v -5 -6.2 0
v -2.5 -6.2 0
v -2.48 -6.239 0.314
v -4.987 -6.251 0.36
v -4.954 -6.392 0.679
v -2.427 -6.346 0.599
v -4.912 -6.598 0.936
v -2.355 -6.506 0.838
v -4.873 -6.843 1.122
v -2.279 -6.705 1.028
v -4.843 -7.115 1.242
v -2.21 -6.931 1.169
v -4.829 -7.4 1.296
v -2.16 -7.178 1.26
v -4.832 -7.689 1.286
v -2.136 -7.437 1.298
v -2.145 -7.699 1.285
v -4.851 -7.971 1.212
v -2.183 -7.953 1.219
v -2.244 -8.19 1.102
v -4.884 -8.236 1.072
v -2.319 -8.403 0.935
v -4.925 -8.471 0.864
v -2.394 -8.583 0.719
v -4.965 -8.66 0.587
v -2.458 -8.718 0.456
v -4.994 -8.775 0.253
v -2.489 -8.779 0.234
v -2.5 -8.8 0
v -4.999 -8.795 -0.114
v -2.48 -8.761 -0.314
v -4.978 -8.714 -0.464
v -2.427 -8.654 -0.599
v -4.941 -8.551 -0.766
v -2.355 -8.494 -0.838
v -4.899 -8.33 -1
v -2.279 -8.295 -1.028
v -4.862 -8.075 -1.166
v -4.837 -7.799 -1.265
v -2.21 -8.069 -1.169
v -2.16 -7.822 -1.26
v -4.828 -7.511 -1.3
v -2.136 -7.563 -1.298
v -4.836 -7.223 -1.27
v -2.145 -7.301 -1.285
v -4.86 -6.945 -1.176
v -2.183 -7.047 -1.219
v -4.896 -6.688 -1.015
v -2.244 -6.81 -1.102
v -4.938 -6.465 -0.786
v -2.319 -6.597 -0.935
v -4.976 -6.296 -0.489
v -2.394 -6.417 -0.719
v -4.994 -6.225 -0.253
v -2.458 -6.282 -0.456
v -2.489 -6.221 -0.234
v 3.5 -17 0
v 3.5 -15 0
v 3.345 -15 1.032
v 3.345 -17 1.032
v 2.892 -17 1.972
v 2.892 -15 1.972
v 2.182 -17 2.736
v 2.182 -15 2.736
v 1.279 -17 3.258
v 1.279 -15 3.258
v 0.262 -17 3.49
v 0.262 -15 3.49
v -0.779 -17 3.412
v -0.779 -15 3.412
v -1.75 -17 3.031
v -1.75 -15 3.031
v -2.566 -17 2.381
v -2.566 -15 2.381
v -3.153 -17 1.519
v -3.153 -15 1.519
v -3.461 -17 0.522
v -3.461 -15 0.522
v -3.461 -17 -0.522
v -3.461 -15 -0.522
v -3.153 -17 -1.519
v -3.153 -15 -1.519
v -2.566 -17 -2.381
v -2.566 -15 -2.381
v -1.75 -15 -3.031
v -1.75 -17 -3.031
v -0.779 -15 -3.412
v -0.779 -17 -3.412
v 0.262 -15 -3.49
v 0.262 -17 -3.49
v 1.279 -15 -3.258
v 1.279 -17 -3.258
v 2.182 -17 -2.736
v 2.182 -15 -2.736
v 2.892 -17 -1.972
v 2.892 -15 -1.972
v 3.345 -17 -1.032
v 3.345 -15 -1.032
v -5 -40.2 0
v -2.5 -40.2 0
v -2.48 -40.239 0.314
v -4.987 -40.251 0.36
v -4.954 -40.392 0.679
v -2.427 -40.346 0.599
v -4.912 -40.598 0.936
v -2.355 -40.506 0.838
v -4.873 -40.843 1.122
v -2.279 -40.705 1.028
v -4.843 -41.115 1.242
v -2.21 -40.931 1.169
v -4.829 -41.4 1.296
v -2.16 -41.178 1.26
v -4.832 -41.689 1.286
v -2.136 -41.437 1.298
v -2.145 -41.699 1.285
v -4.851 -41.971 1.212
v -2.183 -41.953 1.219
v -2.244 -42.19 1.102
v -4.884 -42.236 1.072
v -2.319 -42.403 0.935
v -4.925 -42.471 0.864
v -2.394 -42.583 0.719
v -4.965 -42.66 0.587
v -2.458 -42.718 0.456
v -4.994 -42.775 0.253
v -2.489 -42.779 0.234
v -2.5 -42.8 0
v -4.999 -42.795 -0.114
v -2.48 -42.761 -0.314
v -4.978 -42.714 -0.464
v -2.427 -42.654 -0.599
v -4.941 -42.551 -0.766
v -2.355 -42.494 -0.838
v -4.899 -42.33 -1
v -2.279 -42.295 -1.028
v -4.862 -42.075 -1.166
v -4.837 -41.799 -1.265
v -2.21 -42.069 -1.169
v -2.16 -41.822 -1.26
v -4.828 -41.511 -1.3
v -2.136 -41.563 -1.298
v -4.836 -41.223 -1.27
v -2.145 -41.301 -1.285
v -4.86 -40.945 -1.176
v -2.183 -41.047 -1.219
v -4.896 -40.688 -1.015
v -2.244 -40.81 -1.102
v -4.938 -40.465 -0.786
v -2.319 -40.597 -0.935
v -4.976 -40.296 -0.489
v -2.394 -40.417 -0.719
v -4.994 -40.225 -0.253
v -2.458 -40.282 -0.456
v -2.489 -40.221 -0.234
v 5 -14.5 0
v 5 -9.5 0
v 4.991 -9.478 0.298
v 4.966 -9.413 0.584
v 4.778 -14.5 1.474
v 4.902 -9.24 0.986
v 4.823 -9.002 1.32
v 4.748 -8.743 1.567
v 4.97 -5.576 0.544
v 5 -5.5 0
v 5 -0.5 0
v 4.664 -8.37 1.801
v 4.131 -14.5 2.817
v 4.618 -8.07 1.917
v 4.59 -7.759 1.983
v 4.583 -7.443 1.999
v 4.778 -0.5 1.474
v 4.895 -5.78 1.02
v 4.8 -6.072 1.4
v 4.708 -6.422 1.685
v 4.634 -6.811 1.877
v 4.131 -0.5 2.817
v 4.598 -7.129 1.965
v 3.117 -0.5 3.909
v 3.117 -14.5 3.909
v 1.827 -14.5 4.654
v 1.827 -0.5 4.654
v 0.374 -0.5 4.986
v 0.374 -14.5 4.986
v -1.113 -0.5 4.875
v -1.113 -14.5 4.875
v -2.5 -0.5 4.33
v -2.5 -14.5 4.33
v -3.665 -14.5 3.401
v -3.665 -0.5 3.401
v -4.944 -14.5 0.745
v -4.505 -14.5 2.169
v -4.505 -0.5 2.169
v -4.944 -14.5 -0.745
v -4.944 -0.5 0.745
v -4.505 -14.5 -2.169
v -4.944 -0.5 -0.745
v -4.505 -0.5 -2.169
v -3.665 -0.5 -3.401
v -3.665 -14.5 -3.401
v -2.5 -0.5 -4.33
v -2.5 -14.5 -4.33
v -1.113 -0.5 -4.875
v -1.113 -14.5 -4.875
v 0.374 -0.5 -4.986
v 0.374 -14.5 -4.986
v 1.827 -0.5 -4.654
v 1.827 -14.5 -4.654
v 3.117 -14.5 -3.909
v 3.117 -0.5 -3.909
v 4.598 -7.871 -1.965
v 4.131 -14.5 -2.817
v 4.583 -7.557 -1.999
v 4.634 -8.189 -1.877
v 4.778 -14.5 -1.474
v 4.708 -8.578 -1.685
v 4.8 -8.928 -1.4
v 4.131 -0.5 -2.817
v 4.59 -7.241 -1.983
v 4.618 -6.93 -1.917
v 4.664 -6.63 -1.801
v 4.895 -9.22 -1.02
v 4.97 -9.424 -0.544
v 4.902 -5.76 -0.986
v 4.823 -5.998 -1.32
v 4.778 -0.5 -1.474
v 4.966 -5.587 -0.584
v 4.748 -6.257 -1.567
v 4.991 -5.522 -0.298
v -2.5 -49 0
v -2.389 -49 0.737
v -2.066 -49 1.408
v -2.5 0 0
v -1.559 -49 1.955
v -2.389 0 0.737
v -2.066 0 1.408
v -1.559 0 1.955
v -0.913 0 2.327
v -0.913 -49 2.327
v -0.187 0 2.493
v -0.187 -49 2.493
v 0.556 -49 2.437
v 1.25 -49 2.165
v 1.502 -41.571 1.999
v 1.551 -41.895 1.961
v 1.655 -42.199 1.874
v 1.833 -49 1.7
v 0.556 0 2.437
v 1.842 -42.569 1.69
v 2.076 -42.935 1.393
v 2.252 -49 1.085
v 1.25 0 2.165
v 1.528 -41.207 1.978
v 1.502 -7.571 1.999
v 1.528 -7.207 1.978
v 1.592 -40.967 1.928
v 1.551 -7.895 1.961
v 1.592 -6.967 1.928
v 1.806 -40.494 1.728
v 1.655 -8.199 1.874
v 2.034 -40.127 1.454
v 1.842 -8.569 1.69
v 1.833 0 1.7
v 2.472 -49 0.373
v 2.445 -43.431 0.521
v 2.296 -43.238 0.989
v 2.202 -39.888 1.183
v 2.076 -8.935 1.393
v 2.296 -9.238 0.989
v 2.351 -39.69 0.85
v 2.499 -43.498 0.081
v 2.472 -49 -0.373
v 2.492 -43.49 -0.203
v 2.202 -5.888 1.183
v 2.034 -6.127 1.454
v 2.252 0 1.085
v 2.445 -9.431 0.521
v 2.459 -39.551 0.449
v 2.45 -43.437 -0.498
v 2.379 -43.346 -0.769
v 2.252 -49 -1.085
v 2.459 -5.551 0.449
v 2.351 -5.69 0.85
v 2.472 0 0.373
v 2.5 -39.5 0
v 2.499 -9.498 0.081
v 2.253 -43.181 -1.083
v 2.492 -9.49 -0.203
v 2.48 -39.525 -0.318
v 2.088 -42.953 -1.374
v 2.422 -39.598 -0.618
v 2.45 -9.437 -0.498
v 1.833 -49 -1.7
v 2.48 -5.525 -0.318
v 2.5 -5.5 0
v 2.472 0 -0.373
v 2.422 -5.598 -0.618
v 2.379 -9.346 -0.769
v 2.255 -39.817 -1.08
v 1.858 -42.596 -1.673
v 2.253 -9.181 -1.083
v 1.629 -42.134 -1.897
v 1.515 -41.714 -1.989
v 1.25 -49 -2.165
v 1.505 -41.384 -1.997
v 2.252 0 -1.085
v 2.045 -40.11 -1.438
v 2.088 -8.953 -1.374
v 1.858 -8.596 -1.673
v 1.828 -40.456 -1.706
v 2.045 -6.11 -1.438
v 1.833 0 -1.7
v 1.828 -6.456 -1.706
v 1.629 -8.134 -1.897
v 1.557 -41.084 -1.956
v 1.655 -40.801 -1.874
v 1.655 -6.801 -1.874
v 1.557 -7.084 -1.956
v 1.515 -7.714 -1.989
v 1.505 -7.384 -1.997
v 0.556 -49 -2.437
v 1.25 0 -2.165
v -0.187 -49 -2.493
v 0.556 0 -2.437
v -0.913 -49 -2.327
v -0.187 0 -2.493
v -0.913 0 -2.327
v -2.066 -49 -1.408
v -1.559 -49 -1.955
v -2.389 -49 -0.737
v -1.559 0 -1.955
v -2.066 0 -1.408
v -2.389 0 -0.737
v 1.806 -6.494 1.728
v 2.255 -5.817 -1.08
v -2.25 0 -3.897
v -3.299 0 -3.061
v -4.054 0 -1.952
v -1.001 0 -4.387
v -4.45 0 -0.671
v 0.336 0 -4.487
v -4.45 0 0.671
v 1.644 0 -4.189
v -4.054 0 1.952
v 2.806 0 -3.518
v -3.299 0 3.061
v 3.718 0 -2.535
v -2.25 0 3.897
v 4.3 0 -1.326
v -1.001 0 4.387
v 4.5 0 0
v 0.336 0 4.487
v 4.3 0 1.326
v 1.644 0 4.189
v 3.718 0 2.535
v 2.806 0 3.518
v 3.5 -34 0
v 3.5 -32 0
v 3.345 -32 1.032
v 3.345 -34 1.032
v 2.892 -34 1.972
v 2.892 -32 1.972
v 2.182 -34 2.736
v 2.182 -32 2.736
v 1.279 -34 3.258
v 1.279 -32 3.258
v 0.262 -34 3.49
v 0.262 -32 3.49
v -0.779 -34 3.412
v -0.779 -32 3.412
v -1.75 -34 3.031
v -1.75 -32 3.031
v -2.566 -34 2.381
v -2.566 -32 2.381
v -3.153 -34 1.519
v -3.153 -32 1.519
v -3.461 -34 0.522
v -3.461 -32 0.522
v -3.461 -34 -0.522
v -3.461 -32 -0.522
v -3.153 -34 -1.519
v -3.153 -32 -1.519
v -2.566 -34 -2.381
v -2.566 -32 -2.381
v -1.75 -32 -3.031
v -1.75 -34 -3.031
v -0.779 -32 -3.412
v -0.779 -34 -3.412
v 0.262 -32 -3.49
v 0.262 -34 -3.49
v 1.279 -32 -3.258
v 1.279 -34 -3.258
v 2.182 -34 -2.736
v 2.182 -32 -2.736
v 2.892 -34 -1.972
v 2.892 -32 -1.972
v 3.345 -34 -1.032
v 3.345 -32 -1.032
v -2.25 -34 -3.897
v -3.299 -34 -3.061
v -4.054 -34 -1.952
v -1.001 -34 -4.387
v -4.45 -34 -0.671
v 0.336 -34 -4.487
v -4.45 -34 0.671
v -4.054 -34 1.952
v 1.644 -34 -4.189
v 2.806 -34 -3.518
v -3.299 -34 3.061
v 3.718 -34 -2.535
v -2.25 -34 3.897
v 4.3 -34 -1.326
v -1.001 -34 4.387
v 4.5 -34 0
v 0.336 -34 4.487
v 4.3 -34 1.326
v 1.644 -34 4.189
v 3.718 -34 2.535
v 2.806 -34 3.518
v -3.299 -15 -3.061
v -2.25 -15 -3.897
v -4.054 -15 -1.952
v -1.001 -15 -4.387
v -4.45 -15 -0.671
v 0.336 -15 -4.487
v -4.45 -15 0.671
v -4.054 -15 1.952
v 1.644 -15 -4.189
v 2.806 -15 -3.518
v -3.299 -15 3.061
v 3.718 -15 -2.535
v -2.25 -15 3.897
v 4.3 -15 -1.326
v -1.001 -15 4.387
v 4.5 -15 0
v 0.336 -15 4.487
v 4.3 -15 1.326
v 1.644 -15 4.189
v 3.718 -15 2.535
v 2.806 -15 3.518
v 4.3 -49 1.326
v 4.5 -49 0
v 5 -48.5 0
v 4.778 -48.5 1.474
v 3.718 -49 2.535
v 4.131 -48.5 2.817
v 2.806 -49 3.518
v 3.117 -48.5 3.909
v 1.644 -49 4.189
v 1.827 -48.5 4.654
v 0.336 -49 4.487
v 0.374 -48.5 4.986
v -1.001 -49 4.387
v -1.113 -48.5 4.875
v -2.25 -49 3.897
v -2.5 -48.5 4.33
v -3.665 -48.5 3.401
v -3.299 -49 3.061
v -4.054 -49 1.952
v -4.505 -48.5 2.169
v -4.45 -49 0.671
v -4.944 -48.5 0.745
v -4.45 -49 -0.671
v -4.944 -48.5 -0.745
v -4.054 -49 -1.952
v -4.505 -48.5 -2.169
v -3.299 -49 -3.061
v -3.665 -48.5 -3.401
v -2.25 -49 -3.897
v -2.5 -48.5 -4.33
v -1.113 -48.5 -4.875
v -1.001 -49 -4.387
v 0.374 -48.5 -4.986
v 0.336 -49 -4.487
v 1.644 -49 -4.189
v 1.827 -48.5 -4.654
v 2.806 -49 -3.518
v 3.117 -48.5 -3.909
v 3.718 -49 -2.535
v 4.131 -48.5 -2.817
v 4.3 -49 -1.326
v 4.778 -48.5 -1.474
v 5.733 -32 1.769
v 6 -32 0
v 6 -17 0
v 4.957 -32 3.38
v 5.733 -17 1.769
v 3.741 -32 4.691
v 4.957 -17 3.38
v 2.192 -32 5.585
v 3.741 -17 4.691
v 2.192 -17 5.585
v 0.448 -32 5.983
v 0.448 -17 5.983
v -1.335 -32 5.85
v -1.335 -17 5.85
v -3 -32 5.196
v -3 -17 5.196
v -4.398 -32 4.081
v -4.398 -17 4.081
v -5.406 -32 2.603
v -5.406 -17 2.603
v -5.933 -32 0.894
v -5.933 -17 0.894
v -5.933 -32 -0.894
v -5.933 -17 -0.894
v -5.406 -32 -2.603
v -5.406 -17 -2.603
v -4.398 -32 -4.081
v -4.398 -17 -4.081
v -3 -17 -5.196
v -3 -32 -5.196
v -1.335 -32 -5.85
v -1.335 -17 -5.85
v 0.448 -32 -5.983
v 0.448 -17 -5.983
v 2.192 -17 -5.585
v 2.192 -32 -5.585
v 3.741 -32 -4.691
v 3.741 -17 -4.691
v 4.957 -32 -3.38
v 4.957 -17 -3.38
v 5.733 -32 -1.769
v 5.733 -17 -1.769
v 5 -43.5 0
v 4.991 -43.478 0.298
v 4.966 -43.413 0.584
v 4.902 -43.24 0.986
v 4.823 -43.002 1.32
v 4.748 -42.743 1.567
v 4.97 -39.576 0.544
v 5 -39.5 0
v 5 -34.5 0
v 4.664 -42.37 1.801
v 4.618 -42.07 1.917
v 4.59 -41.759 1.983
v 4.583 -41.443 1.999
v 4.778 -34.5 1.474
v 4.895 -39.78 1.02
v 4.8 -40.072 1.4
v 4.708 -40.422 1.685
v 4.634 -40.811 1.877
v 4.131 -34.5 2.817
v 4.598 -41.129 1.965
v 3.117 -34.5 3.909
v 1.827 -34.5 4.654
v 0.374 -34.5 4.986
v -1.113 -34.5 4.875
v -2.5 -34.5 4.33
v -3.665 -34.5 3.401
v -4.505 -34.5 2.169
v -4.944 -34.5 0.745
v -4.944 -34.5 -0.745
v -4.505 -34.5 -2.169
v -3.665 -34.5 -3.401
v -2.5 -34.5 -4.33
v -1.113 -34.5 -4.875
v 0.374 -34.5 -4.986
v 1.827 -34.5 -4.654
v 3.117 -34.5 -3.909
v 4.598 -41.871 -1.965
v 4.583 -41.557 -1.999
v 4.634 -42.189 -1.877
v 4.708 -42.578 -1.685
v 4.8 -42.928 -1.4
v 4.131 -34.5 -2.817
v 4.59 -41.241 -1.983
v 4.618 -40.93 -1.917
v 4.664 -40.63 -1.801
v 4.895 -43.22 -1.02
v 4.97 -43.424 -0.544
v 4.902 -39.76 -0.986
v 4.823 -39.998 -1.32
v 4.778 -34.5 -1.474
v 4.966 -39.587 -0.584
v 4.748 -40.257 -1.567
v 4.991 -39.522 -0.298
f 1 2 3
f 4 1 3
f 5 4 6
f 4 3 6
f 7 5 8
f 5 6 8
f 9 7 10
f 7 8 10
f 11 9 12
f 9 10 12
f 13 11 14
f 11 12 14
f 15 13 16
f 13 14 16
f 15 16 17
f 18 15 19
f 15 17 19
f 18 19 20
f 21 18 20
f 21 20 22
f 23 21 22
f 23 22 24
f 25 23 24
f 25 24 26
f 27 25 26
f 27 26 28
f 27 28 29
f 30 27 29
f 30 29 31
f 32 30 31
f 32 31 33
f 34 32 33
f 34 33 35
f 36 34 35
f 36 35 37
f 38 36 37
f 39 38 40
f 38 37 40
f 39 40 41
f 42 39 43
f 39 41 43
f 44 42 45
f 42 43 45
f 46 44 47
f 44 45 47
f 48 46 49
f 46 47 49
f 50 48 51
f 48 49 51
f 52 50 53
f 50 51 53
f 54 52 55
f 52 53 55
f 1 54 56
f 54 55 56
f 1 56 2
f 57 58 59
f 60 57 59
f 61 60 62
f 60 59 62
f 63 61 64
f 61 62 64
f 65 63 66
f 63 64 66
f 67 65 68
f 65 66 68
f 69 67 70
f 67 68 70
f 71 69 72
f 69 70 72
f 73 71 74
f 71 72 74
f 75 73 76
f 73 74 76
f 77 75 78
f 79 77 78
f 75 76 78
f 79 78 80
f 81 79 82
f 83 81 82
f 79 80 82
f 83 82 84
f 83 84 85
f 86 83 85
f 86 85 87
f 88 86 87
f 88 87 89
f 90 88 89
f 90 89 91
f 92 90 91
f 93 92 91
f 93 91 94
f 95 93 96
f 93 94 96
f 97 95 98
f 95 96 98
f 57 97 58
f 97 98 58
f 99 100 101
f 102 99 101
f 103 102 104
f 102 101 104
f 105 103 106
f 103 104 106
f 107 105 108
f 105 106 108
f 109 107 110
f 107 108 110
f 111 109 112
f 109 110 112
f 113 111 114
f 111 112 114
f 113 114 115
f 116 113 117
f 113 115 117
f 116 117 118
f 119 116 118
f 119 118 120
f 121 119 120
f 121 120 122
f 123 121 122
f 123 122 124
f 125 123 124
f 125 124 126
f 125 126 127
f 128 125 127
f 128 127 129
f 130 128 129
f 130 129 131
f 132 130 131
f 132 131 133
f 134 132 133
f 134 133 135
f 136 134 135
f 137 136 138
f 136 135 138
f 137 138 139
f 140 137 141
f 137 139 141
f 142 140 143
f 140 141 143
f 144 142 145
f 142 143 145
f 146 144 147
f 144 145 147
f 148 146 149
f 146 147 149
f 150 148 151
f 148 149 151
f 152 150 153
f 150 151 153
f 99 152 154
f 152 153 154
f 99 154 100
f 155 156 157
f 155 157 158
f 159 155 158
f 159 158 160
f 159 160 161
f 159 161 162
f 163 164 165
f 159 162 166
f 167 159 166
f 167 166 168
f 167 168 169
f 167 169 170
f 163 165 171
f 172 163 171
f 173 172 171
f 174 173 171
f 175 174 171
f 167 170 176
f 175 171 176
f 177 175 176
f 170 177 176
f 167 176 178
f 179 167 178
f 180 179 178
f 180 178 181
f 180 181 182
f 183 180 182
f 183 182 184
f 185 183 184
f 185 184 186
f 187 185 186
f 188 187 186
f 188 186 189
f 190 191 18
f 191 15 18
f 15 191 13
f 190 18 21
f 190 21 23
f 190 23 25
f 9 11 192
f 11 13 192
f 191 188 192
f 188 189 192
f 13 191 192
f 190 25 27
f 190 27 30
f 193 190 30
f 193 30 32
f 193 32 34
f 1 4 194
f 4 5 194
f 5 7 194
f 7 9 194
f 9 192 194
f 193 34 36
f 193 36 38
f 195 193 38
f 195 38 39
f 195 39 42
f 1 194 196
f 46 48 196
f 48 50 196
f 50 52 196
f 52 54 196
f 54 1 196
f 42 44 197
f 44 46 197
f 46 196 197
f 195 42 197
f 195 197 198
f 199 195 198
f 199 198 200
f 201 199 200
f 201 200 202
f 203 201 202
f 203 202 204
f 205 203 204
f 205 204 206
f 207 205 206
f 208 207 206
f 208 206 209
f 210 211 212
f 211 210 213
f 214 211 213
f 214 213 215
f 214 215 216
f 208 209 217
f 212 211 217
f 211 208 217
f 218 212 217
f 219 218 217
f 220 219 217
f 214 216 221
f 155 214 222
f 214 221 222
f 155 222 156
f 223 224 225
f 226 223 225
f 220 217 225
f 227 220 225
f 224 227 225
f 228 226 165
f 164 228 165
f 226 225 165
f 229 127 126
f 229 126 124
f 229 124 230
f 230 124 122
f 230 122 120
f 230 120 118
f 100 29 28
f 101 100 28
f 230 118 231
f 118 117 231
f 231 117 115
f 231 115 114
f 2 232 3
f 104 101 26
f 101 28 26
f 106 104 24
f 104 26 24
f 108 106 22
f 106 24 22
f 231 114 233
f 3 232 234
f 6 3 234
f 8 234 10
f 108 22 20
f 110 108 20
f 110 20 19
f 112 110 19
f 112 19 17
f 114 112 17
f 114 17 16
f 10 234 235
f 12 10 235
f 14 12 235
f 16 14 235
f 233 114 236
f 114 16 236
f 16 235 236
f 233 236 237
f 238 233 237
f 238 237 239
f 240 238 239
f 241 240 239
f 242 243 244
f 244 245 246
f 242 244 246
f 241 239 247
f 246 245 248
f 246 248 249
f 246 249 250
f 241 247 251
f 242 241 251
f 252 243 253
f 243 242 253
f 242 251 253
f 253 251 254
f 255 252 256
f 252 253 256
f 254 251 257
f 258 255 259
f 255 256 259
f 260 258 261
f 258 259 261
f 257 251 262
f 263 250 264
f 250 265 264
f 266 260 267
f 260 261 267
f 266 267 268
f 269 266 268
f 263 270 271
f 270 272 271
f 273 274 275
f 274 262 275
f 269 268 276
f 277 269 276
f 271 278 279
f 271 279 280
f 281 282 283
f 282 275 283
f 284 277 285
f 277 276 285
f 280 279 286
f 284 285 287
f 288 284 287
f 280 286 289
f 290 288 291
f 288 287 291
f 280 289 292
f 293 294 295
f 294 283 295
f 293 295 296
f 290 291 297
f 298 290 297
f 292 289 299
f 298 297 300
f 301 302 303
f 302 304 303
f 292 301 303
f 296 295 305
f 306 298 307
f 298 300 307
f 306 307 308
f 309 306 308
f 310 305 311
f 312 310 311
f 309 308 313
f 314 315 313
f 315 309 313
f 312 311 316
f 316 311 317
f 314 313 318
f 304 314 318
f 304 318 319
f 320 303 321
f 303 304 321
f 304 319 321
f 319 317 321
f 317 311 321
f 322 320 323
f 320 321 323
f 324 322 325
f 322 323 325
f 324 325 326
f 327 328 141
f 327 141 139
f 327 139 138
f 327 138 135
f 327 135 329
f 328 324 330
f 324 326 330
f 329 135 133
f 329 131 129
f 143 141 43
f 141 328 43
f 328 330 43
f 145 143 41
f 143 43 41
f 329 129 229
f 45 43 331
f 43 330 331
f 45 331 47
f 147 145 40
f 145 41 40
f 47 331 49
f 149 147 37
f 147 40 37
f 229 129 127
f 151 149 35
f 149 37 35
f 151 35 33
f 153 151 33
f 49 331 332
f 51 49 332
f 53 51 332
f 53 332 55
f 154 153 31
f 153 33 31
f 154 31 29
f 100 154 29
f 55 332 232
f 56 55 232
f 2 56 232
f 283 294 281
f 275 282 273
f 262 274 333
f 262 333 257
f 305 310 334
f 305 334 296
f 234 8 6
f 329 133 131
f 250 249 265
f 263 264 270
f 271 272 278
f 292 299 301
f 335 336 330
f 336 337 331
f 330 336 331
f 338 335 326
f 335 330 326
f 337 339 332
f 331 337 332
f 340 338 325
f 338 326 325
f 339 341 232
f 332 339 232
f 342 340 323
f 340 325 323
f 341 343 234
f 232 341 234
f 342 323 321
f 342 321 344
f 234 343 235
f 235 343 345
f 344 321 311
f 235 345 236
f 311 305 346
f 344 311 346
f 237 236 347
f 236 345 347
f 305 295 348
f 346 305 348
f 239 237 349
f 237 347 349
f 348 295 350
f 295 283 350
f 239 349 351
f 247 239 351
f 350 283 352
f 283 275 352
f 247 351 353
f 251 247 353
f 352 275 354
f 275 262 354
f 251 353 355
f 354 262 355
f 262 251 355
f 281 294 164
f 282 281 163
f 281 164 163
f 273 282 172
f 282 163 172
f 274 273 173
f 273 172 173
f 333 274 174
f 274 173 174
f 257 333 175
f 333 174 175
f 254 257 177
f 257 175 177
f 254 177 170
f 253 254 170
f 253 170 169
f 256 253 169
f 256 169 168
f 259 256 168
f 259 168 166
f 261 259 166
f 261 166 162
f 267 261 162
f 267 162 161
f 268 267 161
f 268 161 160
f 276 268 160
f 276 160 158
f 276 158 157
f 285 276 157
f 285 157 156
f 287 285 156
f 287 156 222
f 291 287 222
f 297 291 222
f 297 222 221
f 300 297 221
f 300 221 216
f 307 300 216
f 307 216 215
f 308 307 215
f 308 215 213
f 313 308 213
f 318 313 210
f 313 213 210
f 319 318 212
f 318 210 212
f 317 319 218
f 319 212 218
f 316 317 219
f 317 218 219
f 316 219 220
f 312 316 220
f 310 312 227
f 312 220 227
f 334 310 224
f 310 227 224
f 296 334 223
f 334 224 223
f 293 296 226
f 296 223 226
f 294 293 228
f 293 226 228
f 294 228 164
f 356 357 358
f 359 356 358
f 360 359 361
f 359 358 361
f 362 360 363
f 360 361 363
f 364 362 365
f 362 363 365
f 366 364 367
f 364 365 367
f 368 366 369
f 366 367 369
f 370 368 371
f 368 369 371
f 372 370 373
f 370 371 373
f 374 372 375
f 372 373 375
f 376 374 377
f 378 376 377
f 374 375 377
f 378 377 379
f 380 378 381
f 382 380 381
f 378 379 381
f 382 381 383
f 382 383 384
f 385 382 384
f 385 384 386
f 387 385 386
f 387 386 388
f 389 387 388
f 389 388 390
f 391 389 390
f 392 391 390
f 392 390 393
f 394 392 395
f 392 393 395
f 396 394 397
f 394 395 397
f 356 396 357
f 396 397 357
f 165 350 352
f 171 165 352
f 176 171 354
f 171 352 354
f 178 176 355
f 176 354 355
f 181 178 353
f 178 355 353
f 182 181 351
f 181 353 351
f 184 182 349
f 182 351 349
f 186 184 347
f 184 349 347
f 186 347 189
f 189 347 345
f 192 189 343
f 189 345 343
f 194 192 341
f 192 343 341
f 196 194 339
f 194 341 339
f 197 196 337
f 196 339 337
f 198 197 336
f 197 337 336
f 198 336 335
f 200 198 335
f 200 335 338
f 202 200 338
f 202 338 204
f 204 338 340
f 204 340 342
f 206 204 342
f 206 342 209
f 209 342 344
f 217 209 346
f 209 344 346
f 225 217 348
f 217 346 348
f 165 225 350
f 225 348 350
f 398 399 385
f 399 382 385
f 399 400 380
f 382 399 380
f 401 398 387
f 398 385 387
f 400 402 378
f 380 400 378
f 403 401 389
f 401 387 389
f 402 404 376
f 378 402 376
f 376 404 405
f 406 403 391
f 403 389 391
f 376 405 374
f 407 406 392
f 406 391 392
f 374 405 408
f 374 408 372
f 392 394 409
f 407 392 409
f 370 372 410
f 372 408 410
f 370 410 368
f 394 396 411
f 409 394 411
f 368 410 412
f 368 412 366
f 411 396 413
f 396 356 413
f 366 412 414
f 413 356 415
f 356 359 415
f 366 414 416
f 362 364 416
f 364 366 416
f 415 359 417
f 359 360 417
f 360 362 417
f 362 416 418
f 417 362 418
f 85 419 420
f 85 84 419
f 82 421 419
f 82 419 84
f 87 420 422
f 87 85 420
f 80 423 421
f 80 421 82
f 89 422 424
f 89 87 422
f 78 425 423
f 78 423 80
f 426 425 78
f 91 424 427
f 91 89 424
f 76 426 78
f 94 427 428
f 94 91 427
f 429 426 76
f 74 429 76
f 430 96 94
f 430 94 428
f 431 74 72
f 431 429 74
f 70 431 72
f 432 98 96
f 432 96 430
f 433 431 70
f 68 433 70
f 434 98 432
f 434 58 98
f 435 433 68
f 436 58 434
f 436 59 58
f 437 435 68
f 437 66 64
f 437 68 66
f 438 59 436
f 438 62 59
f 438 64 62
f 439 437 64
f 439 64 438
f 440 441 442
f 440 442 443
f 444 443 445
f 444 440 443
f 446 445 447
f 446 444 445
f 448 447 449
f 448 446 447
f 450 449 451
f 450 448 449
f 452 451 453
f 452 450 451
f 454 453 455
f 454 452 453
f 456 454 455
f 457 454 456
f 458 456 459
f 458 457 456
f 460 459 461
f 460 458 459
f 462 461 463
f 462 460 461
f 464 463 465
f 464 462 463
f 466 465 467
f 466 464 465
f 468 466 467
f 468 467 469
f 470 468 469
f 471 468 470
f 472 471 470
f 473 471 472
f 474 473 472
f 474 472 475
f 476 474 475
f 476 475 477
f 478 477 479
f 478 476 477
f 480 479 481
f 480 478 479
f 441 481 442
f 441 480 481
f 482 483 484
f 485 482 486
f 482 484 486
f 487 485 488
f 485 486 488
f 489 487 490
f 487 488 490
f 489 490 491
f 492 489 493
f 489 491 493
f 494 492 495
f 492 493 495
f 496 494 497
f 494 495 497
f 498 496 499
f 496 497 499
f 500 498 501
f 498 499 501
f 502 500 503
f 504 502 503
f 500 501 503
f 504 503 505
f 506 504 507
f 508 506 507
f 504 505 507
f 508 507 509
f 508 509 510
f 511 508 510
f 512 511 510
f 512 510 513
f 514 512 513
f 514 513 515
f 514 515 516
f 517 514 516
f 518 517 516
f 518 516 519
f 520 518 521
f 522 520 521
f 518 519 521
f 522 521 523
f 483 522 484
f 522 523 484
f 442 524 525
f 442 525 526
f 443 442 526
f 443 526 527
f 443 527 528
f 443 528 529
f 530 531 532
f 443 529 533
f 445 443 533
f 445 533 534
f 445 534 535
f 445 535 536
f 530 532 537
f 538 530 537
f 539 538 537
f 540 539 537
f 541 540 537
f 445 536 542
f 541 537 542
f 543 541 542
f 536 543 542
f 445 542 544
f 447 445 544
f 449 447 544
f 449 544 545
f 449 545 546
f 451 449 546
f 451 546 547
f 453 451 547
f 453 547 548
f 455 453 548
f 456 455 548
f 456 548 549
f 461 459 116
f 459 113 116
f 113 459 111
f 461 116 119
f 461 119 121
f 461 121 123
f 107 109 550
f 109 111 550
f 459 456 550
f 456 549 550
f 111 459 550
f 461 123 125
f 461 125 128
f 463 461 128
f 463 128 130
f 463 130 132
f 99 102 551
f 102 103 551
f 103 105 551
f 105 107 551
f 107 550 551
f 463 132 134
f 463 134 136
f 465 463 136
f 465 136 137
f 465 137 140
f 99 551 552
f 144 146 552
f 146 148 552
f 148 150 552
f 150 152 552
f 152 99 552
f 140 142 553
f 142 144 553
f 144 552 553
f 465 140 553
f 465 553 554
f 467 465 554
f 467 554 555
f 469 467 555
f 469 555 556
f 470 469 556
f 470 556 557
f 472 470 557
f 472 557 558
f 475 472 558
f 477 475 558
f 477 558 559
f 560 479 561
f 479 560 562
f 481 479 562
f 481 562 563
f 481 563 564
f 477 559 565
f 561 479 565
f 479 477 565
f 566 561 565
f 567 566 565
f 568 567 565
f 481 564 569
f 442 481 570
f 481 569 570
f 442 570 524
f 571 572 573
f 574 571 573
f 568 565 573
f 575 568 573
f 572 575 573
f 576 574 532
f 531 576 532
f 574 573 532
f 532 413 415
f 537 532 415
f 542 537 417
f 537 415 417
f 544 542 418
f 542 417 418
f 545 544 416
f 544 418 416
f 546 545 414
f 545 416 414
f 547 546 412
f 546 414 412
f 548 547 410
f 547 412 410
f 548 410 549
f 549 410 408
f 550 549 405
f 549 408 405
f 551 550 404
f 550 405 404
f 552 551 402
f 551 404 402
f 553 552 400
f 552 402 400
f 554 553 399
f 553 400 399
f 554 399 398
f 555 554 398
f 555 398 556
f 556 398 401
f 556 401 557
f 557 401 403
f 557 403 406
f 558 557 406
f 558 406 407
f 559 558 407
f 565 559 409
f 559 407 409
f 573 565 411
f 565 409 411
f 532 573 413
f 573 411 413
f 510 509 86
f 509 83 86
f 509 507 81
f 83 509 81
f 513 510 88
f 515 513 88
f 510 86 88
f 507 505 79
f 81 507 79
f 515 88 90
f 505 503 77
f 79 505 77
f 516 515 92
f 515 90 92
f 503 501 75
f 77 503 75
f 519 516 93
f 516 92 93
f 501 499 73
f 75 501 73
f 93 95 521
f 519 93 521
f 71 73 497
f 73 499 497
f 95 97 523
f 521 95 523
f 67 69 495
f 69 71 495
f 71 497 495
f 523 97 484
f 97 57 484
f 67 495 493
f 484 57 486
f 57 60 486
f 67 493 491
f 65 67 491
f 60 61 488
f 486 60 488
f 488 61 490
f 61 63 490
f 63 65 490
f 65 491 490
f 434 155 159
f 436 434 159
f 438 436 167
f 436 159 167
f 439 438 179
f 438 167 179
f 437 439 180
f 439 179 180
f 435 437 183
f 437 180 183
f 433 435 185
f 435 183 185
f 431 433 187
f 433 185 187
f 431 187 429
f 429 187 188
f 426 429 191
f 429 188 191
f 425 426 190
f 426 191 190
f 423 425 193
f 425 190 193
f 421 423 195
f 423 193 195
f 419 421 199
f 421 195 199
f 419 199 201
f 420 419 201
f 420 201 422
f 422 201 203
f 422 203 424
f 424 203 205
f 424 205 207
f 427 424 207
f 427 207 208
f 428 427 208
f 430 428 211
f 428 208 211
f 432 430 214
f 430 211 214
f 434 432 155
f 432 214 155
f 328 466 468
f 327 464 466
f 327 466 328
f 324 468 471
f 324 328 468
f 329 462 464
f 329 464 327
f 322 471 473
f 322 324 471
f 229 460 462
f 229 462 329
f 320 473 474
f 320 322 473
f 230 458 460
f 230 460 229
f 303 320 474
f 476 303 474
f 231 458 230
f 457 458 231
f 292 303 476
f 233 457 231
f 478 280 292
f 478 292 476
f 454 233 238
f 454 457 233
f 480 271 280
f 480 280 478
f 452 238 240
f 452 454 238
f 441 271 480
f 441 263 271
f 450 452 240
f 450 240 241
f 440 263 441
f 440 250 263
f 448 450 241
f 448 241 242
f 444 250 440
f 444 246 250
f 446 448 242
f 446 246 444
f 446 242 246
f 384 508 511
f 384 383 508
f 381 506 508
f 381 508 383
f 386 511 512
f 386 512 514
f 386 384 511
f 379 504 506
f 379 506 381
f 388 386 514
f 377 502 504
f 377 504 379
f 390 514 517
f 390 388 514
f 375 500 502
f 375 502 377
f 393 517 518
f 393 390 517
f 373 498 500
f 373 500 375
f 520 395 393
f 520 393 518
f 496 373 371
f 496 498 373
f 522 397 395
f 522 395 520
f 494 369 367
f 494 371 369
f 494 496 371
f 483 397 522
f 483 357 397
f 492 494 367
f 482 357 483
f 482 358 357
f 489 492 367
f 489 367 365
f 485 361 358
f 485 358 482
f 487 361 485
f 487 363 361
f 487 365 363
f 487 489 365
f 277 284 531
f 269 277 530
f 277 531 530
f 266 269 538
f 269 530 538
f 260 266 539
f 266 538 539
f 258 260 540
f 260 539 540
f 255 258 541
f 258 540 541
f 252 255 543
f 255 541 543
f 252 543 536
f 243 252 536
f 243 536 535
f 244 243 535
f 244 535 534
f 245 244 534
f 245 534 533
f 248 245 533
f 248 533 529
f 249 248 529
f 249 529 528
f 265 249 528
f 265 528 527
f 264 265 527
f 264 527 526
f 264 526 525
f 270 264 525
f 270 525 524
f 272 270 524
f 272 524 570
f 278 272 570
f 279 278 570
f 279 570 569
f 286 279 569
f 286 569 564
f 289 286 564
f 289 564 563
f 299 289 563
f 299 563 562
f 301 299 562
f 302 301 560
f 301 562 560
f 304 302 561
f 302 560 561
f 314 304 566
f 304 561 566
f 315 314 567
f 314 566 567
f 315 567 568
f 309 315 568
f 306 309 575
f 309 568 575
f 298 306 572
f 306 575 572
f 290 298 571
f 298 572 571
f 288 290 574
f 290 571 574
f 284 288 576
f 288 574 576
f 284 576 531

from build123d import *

# Parameters (mm, degrees)
F0_R      = 5
F1_DEPTH  = 15
F2_R      = 3.5
F3_DEPTH  = 2
F4_R      = 6
F5_DEPTH  = 15
F6_R      = 3.5
F7_DEPTH  = 2
F8_R      = 5
F9_DEPTH  = 15
F10_SIZE  = 0.5
F12_R     = 1.3
F13_DEPTH = 25
F12_R_2   = 2
F14_DEPTH = 5
F15_R     = 2.5
F16_DEPTH = 50


with BuildPart() as f1:
    # F0 (on Front) → F1 (new body)
    with BuildSketch(Plane.XZ):
        Circle(F0_R)
    extrude(amount=F1_DEPTH)

    # F2 (on face) → F3 (join)
    with BuildSketch(Plane.XZ.offset(15)):
        Circle(F2_R)
    extrude(amount=F3_DEPTH)

    # F4 (on face) → F5 (join)
    with BuildSketch(Plane.XZ.offset(17)):
        Circle(F4_R)
    extrude(amount=F5_DEPTH)

    # F6 (on face) → F7 (join)
    with BuildSketch(Plane.XZ.offset(32)):
        Circle(F6_R)
    extrude(amount=F7_DEPTH)

    # F8 (on face) → F9 (join)
    with BuildSketch(Plane.XZ.offset(34)):
        Circle(F8_R)
    extrude(amount=F9_DEPTH)

    # F10
    f10_edges = [f1.edges().sort_by_distance(p)[0] for p in [
        (-5, -49, 0),
        (-5, -34, 0),
        (-5, 0, 0),
        (-5, -15, 0),
    ]]
    chamfer(f10_edges, length=F10_SIZE)

    # F12 (on offset) → F13 (cut)
    with BuildSketch(Plane.YZ.offset(5)):
        with Locations((-7.5, 0)):
            Circle(F12_R)
        with Locations((-41.5, 0)):
            Circle(F12_R)
    extrude(amount=-F13_DEPTH, mode=Mode.SUBTRACT)

    # F12 (on offset) → F14 (cut)
    with BuildSketch(Plane.YZ.offset(5)):
        with Locations((-41.5, 0)):
            Circle(F12_R_2)
        with Locations((-41.5, 0)):
            Circle(F12_R, mode=Mode.SUBTRACT)
        with Locations((-7.5, 0)):
            Circle(F12_R_2)
        with Locations((-7.5, 0)):
            Circle(F12_R, mode=Mode.SUBTRACT)
    extrude(amount=-F14_DEPTH, mode=Mode.SUBTRACT)

    # F15 (on face) → F16 (cut)
    with BuildSketch(Plane(origin=(0, 0, 0), x_dir=(-1, 0, 0), z_dir=(0, 1, 0))):
        Circle(F15_R)
    extrude(amount=-F16_DEPTH, mode=Mode.SUBTRACT)


solid = f1.part
